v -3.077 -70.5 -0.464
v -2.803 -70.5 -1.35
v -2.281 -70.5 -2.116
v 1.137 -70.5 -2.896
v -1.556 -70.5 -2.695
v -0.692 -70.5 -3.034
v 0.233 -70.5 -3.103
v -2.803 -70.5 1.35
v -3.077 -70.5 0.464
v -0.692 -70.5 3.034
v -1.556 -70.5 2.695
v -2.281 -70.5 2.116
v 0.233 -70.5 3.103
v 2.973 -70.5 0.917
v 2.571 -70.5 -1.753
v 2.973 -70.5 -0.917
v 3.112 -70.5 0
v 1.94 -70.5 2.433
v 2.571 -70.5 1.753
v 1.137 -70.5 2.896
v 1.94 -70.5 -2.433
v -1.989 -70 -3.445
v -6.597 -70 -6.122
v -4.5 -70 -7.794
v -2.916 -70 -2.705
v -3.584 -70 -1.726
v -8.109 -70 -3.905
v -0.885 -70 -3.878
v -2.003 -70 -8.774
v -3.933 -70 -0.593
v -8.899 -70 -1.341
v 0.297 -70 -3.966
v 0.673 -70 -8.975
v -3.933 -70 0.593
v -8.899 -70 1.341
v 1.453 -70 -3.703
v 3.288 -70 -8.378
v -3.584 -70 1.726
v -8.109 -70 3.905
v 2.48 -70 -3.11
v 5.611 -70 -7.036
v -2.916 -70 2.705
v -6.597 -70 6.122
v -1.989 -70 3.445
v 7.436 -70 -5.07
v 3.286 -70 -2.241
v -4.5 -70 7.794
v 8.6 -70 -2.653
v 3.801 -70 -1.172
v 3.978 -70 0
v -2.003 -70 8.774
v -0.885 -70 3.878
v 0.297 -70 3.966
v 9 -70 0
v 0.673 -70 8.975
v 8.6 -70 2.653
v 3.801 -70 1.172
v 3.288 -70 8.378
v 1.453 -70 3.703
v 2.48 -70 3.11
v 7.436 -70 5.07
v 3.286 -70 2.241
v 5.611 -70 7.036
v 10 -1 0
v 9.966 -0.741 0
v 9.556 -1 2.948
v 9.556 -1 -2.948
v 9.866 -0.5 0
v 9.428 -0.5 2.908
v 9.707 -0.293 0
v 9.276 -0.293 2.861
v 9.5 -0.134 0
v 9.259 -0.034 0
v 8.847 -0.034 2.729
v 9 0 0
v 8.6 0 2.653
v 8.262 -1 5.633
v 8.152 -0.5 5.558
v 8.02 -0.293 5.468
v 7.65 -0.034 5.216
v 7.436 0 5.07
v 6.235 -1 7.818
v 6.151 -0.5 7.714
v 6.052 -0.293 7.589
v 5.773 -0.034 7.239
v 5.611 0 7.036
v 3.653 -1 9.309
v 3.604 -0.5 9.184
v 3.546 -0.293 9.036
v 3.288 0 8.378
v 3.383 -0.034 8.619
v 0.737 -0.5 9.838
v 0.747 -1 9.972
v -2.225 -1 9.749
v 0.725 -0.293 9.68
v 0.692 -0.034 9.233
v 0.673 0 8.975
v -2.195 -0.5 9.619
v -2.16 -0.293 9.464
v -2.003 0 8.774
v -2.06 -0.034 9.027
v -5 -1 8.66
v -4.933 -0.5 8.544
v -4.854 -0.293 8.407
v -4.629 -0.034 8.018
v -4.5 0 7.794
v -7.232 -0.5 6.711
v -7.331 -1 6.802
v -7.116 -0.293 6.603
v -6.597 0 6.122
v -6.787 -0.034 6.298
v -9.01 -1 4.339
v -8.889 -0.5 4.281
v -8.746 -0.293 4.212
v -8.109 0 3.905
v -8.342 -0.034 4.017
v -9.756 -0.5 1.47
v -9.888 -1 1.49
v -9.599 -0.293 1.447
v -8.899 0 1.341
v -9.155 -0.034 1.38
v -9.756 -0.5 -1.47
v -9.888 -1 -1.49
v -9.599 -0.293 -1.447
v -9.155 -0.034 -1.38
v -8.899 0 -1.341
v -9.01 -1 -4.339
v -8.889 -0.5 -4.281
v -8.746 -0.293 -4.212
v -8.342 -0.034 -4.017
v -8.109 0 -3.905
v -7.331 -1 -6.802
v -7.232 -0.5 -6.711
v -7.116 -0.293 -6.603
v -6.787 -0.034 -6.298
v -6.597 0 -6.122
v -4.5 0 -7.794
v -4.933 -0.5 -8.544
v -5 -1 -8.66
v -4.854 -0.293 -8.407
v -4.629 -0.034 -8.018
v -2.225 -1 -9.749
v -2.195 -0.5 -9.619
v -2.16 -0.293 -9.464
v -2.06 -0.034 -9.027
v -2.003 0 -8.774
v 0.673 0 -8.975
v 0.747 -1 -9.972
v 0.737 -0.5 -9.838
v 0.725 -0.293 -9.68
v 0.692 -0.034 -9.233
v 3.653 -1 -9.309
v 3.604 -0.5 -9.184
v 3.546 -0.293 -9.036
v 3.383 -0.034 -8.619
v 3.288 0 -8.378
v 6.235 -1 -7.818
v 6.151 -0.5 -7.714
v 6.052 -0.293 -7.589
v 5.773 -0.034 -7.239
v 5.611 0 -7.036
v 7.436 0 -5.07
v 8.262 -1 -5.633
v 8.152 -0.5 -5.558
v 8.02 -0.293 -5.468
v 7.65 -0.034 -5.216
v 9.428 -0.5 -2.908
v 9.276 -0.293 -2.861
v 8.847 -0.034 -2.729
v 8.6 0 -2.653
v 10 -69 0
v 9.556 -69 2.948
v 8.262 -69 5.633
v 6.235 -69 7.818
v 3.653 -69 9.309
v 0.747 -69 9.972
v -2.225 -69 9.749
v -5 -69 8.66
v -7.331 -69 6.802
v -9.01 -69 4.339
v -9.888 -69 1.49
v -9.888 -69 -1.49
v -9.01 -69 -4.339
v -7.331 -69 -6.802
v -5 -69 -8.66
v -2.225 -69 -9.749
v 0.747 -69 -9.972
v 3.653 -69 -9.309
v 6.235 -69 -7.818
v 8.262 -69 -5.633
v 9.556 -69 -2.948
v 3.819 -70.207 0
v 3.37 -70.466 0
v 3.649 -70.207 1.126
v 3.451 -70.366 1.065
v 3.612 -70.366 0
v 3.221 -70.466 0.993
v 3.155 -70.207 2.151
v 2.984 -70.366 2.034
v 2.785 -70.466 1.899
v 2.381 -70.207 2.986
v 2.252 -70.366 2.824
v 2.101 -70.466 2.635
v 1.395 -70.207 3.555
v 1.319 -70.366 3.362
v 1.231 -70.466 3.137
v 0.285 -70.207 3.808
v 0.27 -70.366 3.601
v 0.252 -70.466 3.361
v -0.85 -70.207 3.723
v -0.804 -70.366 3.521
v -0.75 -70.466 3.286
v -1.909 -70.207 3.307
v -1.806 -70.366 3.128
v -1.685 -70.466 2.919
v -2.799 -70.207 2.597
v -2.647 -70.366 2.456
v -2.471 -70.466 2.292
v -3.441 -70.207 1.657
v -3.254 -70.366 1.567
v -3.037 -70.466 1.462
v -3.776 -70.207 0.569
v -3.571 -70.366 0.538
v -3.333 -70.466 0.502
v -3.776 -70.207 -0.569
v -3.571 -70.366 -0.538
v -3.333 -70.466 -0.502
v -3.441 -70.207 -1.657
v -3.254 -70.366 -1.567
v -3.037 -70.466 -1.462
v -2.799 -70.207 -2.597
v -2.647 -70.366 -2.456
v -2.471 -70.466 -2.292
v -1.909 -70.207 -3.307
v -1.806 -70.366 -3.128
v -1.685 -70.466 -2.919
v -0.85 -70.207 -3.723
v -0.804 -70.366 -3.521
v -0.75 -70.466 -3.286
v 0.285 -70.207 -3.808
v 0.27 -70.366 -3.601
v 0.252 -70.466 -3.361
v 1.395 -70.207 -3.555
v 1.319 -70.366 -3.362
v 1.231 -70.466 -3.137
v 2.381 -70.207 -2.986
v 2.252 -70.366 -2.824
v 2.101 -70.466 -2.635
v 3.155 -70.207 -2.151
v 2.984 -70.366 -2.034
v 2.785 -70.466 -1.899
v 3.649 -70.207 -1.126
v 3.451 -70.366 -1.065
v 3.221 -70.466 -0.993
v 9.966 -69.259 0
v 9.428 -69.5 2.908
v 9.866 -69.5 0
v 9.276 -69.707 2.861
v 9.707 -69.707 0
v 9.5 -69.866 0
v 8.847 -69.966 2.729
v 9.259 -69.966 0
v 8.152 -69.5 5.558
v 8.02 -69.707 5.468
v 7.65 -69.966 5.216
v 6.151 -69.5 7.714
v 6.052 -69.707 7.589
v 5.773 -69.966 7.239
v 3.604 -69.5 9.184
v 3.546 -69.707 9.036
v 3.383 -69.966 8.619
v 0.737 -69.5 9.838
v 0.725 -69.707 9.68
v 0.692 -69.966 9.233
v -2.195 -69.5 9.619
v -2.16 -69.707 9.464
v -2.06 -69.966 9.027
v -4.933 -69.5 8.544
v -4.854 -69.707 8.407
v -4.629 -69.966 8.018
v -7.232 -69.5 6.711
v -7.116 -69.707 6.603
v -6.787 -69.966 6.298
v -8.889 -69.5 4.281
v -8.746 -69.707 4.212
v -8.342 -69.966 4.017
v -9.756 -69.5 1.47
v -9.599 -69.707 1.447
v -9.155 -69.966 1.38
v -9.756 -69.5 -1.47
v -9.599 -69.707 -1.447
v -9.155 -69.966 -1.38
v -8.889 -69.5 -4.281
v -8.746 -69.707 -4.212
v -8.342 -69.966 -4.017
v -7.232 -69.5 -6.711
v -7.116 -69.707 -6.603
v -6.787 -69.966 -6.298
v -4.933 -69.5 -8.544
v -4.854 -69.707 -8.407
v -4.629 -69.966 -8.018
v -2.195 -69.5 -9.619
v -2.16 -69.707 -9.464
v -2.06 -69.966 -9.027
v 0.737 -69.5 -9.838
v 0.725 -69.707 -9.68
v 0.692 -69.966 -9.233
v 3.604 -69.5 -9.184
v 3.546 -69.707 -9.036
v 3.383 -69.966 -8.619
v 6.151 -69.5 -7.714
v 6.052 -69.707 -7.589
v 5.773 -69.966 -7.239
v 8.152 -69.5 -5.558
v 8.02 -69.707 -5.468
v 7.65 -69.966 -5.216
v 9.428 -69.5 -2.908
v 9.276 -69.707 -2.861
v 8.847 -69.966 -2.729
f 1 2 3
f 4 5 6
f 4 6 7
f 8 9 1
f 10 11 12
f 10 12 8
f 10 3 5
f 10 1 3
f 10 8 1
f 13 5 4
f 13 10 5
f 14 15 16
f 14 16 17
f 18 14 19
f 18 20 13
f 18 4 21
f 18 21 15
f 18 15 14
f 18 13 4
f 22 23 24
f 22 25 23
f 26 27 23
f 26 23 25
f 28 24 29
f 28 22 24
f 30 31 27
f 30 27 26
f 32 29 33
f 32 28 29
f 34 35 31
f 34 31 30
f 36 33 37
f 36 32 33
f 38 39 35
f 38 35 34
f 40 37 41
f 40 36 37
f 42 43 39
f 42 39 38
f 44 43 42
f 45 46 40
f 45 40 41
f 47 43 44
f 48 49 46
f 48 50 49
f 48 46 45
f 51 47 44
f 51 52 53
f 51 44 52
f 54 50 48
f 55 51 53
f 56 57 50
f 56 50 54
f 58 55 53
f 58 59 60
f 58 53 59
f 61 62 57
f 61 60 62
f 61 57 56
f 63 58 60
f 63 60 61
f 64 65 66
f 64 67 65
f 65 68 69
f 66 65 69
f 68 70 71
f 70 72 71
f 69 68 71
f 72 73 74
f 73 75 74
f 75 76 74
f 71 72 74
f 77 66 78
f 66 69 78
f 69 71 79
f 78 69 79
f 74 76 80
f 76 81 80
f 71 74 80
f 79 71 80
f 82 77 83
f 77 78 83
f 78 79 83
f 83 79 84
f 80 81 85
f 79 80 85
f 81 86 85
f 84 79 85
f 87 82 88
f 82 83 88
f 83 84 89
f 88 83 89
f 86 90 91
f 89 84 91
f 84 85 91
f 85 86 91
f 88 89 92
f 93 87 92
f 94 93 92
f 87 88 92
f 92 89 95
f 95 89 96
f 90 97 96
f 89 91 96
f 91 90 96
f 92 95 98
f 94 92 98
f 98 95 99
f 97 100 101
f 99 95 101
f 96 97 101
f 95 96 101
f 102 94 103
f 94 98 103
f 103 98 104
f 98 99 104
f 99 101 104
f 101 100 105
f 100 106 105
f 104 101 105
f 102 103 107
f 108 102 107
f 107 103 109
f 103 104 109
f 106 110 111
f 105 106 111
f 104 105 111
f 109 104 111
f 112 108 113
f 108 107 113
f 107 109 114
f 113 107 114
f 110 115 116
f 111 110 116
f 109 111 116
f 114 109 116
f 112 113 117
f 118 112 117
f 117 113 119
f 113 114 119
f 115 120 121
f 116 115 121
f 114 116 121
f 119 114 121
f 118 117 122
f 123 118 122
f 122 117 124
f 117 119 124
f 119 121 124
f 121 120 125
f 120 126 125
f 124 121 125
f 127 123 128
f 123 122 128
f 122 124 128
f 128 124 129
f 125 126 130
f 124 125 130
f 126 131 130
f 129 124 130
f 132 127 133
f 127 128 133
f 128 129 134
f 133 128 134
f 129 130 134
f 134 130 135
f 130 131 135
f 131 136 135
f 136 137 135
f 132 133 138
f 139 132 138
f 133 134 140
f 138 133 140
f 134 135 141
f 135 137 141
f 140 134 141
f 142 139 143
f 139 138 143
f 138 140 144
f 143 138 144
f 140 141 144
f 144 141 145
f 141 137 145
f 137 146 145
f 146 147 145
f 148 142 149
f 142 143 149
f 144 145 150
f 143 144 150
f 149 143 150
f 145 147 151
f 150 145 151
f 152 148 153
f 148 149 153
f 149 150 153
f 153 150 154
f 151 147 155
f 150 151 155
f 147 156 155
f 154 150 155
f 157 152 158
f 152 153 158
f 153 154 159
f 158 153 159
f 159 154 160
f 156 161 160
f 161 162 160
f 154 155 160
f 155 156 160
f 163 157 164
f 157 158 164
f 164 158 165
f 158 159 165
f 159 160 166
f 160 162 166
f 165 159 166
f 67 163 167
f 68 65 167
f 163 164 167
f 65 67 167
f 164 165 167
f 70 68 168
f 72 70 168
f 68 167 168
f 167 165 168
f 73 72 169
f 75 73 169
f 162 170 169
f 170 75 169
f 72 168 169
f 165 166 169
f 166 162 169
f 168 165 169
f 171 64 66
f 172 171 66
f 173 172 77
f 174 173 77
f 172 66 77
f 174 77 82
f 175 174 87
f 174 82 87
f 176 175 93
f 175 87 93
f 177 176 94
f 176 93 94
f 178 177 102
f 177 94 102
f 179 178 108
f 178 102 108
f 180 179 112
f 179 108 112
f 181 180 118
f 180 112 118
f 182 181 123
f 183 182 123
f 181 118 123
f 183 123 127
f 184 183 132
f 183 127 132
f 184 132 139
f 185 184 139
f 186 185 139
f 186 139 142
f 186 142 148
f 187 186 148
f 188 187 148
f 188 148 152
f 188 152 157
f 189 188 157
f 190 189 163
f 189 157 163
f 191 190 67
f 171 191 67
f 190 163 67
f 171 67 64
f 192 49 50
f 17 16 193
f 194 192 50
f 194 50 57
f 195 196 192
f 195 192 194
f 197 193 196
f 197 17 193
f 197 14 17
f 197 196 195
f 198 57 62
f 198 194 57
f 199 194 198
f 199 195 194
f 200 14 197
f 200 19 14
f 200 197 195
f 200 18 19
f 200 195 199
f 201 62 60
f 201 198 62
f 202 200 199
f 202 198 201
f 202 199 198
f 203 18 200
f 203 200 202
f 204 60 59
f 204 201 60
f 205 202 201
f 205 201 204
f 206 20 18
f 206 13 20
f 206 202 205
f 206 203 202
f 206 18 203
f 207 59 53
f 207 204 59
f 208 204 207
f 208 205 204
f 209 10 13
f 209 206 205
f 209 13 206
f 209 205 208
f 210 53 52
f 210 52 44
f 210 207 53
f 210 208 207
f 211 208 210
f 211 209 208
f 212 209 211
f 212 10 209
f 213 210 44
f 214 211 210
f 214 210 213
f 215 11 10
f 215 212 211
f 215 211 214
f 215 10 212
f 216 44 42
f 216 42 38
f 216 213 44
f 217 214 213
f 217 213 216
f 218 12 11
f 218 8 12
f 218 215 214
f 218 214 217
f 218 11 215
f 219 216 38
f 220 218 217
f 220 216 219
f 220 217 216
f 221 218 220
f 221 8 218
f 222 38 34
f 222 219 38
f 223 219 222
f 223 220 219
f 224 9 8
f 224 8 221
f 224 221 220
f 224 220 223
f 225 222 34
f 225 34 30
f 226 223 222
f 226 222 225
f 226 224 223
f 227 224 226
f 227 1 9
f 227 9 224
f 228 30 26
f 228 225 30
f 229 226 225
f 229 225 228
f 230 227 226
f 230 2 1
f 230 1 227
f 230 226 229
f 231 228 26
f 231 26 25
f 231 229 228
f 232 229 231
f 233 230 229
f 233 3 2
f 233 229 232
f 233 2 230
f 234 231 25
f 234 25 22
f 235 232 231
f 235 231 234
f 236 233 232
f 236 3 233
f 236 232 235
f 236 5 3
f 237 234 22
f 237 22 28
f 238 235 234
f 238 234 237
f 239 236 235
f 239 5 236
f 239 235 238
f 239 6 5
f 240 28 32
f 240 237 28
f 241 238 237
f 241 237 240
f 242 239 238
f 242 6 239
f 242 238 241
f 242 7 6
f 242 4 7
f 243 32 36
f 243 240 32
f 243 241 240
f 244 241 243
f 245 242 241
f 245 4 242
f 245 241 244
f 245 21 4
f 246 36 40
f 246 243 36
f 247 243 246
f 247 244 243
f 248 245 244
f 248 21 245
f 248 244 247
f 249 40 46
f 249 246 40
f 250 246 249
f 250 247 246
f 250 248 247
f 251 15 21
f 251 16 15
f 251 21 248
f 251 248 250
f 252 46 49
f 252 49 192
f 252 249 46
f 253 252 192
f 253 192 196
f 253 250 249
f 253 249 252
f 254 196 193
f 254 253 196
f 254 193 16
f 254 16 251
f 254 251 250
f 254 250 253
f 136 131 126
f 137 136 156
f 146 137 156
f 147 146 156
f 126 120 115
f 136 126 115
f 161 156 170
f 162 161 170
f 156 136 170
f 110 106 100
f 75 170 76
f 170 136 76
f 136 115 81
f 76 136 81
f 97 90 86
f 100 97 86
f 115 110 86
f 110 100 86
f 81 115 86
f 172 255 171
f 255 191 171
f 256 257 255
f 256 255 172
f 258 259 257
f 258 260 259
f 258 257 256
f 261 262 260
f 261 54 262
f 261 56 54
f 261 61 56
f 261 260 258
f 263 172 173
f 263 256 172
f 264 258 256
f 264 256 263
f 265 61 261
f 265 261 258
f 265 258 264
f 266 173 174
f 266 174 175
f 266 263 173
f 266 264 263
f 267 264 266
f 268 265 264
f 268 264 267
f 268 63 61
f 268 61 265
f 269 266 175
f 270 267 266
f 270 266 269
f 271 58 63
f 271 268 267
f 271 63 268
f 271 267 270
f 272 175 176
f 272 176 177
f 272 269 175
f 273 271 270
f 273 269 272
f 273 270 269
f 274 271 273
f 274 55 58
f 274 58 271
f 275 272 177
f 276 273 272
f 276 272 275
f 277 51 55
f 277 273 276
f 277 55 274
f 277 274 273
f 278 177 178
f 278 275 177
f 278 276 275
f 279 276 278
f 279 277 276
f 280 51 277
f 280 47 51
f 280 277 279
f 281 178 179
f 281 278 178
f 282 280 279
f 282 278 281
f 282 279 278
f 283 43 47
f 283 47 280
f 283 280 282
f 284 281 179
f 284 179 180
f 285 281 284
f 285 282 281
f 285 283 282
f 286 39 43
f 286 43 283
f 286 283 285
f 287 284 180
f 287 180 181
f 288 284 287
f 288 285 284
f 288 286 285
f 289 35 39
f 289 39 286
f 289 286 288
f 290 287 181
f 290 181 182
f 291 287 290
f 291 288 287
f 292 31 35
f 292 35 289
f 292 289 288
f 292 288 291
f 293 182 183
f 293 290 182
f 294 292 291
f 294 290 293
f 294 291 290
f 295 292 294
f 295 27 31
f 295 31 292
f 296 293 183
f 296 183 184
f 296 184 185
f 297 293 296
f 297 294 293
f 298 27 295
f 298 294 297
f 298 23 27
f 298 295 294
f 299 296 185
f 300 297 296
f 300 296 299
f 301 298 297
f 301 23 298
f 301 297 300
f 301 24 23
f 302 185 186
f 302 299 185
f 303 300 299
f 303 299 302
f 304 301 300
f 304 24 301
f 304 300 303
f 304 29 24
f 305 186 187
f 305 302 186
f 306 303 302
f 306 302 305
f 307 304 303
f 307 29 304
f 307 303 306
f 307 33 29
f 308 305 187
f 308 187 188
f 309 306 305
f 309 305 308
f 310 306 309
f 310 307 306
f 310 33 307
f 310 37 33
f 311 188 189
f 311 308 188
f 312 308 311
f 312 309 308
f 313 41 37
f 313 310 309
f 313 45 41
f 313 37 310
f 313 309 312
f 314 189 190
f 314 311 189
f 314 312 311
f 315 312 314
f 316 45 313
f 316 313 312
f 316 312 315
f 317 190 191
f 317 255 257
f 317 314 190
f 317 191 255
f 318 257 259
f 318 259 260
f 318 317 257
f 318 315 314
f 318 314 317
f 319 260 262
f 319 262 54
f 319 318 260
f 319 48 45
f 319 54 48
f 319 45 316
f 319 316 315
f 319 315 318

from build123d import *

# Parameters (mm, degrees)
F0_R     = 10
F1_DEPTH = 70
F2_R     = 1
F3_R     = 3.9775912989
F4_DEPTH = 0.5


# Not quite as in the source:
# - a fillet or chamfer that OpenCascade refuses, or shapes differently, is made with other operations: its cross-section is extruded or revolved along the edge and cut away or added


with BuildPart() as f1:
    # F0 (on Front) → F1 (new body)
    with BuildSketch(Plane.XZ):
        Circle(F0_R)
    extrude(amount=F1_DEPTH)

    # F2
    f2_edges = [f1.edges().sort_by_distance(p)[0] for p in [
        (-10, -70, 0),
        (-10, 0, 0),
    ]]
    fillet(f2_edges, radius=F2_R)

    # F3 (on face) → F4 (join)
    with BuildSketch(Plane.XZ.offset(70)):
        Circle(F3_R)
    extrude(amount=F4_DEPTH)

    # F5: fillet of radius 1 on 1 edges, made by hand

    # F5_s1 → F5_t2 (revolve, cut)
    with BuildSketch(Plane.XY):
        with BuildLine():
            ThreePointArc((3.9775912989, -70), (3.6115658951, -70.3660254038), (3.1115658951, -70.5))
            Line((3.1115658951, -70.5), (3.9775912989, -70.5))
            Line((3.9775912989, -70.5), (3.9775912989, -70))
        make_face()
    revolve(axis=Axis((0, -70.5, 0), (0, -1, 0)), mode=Mode.SUBTRACT)


solid = f1.part
